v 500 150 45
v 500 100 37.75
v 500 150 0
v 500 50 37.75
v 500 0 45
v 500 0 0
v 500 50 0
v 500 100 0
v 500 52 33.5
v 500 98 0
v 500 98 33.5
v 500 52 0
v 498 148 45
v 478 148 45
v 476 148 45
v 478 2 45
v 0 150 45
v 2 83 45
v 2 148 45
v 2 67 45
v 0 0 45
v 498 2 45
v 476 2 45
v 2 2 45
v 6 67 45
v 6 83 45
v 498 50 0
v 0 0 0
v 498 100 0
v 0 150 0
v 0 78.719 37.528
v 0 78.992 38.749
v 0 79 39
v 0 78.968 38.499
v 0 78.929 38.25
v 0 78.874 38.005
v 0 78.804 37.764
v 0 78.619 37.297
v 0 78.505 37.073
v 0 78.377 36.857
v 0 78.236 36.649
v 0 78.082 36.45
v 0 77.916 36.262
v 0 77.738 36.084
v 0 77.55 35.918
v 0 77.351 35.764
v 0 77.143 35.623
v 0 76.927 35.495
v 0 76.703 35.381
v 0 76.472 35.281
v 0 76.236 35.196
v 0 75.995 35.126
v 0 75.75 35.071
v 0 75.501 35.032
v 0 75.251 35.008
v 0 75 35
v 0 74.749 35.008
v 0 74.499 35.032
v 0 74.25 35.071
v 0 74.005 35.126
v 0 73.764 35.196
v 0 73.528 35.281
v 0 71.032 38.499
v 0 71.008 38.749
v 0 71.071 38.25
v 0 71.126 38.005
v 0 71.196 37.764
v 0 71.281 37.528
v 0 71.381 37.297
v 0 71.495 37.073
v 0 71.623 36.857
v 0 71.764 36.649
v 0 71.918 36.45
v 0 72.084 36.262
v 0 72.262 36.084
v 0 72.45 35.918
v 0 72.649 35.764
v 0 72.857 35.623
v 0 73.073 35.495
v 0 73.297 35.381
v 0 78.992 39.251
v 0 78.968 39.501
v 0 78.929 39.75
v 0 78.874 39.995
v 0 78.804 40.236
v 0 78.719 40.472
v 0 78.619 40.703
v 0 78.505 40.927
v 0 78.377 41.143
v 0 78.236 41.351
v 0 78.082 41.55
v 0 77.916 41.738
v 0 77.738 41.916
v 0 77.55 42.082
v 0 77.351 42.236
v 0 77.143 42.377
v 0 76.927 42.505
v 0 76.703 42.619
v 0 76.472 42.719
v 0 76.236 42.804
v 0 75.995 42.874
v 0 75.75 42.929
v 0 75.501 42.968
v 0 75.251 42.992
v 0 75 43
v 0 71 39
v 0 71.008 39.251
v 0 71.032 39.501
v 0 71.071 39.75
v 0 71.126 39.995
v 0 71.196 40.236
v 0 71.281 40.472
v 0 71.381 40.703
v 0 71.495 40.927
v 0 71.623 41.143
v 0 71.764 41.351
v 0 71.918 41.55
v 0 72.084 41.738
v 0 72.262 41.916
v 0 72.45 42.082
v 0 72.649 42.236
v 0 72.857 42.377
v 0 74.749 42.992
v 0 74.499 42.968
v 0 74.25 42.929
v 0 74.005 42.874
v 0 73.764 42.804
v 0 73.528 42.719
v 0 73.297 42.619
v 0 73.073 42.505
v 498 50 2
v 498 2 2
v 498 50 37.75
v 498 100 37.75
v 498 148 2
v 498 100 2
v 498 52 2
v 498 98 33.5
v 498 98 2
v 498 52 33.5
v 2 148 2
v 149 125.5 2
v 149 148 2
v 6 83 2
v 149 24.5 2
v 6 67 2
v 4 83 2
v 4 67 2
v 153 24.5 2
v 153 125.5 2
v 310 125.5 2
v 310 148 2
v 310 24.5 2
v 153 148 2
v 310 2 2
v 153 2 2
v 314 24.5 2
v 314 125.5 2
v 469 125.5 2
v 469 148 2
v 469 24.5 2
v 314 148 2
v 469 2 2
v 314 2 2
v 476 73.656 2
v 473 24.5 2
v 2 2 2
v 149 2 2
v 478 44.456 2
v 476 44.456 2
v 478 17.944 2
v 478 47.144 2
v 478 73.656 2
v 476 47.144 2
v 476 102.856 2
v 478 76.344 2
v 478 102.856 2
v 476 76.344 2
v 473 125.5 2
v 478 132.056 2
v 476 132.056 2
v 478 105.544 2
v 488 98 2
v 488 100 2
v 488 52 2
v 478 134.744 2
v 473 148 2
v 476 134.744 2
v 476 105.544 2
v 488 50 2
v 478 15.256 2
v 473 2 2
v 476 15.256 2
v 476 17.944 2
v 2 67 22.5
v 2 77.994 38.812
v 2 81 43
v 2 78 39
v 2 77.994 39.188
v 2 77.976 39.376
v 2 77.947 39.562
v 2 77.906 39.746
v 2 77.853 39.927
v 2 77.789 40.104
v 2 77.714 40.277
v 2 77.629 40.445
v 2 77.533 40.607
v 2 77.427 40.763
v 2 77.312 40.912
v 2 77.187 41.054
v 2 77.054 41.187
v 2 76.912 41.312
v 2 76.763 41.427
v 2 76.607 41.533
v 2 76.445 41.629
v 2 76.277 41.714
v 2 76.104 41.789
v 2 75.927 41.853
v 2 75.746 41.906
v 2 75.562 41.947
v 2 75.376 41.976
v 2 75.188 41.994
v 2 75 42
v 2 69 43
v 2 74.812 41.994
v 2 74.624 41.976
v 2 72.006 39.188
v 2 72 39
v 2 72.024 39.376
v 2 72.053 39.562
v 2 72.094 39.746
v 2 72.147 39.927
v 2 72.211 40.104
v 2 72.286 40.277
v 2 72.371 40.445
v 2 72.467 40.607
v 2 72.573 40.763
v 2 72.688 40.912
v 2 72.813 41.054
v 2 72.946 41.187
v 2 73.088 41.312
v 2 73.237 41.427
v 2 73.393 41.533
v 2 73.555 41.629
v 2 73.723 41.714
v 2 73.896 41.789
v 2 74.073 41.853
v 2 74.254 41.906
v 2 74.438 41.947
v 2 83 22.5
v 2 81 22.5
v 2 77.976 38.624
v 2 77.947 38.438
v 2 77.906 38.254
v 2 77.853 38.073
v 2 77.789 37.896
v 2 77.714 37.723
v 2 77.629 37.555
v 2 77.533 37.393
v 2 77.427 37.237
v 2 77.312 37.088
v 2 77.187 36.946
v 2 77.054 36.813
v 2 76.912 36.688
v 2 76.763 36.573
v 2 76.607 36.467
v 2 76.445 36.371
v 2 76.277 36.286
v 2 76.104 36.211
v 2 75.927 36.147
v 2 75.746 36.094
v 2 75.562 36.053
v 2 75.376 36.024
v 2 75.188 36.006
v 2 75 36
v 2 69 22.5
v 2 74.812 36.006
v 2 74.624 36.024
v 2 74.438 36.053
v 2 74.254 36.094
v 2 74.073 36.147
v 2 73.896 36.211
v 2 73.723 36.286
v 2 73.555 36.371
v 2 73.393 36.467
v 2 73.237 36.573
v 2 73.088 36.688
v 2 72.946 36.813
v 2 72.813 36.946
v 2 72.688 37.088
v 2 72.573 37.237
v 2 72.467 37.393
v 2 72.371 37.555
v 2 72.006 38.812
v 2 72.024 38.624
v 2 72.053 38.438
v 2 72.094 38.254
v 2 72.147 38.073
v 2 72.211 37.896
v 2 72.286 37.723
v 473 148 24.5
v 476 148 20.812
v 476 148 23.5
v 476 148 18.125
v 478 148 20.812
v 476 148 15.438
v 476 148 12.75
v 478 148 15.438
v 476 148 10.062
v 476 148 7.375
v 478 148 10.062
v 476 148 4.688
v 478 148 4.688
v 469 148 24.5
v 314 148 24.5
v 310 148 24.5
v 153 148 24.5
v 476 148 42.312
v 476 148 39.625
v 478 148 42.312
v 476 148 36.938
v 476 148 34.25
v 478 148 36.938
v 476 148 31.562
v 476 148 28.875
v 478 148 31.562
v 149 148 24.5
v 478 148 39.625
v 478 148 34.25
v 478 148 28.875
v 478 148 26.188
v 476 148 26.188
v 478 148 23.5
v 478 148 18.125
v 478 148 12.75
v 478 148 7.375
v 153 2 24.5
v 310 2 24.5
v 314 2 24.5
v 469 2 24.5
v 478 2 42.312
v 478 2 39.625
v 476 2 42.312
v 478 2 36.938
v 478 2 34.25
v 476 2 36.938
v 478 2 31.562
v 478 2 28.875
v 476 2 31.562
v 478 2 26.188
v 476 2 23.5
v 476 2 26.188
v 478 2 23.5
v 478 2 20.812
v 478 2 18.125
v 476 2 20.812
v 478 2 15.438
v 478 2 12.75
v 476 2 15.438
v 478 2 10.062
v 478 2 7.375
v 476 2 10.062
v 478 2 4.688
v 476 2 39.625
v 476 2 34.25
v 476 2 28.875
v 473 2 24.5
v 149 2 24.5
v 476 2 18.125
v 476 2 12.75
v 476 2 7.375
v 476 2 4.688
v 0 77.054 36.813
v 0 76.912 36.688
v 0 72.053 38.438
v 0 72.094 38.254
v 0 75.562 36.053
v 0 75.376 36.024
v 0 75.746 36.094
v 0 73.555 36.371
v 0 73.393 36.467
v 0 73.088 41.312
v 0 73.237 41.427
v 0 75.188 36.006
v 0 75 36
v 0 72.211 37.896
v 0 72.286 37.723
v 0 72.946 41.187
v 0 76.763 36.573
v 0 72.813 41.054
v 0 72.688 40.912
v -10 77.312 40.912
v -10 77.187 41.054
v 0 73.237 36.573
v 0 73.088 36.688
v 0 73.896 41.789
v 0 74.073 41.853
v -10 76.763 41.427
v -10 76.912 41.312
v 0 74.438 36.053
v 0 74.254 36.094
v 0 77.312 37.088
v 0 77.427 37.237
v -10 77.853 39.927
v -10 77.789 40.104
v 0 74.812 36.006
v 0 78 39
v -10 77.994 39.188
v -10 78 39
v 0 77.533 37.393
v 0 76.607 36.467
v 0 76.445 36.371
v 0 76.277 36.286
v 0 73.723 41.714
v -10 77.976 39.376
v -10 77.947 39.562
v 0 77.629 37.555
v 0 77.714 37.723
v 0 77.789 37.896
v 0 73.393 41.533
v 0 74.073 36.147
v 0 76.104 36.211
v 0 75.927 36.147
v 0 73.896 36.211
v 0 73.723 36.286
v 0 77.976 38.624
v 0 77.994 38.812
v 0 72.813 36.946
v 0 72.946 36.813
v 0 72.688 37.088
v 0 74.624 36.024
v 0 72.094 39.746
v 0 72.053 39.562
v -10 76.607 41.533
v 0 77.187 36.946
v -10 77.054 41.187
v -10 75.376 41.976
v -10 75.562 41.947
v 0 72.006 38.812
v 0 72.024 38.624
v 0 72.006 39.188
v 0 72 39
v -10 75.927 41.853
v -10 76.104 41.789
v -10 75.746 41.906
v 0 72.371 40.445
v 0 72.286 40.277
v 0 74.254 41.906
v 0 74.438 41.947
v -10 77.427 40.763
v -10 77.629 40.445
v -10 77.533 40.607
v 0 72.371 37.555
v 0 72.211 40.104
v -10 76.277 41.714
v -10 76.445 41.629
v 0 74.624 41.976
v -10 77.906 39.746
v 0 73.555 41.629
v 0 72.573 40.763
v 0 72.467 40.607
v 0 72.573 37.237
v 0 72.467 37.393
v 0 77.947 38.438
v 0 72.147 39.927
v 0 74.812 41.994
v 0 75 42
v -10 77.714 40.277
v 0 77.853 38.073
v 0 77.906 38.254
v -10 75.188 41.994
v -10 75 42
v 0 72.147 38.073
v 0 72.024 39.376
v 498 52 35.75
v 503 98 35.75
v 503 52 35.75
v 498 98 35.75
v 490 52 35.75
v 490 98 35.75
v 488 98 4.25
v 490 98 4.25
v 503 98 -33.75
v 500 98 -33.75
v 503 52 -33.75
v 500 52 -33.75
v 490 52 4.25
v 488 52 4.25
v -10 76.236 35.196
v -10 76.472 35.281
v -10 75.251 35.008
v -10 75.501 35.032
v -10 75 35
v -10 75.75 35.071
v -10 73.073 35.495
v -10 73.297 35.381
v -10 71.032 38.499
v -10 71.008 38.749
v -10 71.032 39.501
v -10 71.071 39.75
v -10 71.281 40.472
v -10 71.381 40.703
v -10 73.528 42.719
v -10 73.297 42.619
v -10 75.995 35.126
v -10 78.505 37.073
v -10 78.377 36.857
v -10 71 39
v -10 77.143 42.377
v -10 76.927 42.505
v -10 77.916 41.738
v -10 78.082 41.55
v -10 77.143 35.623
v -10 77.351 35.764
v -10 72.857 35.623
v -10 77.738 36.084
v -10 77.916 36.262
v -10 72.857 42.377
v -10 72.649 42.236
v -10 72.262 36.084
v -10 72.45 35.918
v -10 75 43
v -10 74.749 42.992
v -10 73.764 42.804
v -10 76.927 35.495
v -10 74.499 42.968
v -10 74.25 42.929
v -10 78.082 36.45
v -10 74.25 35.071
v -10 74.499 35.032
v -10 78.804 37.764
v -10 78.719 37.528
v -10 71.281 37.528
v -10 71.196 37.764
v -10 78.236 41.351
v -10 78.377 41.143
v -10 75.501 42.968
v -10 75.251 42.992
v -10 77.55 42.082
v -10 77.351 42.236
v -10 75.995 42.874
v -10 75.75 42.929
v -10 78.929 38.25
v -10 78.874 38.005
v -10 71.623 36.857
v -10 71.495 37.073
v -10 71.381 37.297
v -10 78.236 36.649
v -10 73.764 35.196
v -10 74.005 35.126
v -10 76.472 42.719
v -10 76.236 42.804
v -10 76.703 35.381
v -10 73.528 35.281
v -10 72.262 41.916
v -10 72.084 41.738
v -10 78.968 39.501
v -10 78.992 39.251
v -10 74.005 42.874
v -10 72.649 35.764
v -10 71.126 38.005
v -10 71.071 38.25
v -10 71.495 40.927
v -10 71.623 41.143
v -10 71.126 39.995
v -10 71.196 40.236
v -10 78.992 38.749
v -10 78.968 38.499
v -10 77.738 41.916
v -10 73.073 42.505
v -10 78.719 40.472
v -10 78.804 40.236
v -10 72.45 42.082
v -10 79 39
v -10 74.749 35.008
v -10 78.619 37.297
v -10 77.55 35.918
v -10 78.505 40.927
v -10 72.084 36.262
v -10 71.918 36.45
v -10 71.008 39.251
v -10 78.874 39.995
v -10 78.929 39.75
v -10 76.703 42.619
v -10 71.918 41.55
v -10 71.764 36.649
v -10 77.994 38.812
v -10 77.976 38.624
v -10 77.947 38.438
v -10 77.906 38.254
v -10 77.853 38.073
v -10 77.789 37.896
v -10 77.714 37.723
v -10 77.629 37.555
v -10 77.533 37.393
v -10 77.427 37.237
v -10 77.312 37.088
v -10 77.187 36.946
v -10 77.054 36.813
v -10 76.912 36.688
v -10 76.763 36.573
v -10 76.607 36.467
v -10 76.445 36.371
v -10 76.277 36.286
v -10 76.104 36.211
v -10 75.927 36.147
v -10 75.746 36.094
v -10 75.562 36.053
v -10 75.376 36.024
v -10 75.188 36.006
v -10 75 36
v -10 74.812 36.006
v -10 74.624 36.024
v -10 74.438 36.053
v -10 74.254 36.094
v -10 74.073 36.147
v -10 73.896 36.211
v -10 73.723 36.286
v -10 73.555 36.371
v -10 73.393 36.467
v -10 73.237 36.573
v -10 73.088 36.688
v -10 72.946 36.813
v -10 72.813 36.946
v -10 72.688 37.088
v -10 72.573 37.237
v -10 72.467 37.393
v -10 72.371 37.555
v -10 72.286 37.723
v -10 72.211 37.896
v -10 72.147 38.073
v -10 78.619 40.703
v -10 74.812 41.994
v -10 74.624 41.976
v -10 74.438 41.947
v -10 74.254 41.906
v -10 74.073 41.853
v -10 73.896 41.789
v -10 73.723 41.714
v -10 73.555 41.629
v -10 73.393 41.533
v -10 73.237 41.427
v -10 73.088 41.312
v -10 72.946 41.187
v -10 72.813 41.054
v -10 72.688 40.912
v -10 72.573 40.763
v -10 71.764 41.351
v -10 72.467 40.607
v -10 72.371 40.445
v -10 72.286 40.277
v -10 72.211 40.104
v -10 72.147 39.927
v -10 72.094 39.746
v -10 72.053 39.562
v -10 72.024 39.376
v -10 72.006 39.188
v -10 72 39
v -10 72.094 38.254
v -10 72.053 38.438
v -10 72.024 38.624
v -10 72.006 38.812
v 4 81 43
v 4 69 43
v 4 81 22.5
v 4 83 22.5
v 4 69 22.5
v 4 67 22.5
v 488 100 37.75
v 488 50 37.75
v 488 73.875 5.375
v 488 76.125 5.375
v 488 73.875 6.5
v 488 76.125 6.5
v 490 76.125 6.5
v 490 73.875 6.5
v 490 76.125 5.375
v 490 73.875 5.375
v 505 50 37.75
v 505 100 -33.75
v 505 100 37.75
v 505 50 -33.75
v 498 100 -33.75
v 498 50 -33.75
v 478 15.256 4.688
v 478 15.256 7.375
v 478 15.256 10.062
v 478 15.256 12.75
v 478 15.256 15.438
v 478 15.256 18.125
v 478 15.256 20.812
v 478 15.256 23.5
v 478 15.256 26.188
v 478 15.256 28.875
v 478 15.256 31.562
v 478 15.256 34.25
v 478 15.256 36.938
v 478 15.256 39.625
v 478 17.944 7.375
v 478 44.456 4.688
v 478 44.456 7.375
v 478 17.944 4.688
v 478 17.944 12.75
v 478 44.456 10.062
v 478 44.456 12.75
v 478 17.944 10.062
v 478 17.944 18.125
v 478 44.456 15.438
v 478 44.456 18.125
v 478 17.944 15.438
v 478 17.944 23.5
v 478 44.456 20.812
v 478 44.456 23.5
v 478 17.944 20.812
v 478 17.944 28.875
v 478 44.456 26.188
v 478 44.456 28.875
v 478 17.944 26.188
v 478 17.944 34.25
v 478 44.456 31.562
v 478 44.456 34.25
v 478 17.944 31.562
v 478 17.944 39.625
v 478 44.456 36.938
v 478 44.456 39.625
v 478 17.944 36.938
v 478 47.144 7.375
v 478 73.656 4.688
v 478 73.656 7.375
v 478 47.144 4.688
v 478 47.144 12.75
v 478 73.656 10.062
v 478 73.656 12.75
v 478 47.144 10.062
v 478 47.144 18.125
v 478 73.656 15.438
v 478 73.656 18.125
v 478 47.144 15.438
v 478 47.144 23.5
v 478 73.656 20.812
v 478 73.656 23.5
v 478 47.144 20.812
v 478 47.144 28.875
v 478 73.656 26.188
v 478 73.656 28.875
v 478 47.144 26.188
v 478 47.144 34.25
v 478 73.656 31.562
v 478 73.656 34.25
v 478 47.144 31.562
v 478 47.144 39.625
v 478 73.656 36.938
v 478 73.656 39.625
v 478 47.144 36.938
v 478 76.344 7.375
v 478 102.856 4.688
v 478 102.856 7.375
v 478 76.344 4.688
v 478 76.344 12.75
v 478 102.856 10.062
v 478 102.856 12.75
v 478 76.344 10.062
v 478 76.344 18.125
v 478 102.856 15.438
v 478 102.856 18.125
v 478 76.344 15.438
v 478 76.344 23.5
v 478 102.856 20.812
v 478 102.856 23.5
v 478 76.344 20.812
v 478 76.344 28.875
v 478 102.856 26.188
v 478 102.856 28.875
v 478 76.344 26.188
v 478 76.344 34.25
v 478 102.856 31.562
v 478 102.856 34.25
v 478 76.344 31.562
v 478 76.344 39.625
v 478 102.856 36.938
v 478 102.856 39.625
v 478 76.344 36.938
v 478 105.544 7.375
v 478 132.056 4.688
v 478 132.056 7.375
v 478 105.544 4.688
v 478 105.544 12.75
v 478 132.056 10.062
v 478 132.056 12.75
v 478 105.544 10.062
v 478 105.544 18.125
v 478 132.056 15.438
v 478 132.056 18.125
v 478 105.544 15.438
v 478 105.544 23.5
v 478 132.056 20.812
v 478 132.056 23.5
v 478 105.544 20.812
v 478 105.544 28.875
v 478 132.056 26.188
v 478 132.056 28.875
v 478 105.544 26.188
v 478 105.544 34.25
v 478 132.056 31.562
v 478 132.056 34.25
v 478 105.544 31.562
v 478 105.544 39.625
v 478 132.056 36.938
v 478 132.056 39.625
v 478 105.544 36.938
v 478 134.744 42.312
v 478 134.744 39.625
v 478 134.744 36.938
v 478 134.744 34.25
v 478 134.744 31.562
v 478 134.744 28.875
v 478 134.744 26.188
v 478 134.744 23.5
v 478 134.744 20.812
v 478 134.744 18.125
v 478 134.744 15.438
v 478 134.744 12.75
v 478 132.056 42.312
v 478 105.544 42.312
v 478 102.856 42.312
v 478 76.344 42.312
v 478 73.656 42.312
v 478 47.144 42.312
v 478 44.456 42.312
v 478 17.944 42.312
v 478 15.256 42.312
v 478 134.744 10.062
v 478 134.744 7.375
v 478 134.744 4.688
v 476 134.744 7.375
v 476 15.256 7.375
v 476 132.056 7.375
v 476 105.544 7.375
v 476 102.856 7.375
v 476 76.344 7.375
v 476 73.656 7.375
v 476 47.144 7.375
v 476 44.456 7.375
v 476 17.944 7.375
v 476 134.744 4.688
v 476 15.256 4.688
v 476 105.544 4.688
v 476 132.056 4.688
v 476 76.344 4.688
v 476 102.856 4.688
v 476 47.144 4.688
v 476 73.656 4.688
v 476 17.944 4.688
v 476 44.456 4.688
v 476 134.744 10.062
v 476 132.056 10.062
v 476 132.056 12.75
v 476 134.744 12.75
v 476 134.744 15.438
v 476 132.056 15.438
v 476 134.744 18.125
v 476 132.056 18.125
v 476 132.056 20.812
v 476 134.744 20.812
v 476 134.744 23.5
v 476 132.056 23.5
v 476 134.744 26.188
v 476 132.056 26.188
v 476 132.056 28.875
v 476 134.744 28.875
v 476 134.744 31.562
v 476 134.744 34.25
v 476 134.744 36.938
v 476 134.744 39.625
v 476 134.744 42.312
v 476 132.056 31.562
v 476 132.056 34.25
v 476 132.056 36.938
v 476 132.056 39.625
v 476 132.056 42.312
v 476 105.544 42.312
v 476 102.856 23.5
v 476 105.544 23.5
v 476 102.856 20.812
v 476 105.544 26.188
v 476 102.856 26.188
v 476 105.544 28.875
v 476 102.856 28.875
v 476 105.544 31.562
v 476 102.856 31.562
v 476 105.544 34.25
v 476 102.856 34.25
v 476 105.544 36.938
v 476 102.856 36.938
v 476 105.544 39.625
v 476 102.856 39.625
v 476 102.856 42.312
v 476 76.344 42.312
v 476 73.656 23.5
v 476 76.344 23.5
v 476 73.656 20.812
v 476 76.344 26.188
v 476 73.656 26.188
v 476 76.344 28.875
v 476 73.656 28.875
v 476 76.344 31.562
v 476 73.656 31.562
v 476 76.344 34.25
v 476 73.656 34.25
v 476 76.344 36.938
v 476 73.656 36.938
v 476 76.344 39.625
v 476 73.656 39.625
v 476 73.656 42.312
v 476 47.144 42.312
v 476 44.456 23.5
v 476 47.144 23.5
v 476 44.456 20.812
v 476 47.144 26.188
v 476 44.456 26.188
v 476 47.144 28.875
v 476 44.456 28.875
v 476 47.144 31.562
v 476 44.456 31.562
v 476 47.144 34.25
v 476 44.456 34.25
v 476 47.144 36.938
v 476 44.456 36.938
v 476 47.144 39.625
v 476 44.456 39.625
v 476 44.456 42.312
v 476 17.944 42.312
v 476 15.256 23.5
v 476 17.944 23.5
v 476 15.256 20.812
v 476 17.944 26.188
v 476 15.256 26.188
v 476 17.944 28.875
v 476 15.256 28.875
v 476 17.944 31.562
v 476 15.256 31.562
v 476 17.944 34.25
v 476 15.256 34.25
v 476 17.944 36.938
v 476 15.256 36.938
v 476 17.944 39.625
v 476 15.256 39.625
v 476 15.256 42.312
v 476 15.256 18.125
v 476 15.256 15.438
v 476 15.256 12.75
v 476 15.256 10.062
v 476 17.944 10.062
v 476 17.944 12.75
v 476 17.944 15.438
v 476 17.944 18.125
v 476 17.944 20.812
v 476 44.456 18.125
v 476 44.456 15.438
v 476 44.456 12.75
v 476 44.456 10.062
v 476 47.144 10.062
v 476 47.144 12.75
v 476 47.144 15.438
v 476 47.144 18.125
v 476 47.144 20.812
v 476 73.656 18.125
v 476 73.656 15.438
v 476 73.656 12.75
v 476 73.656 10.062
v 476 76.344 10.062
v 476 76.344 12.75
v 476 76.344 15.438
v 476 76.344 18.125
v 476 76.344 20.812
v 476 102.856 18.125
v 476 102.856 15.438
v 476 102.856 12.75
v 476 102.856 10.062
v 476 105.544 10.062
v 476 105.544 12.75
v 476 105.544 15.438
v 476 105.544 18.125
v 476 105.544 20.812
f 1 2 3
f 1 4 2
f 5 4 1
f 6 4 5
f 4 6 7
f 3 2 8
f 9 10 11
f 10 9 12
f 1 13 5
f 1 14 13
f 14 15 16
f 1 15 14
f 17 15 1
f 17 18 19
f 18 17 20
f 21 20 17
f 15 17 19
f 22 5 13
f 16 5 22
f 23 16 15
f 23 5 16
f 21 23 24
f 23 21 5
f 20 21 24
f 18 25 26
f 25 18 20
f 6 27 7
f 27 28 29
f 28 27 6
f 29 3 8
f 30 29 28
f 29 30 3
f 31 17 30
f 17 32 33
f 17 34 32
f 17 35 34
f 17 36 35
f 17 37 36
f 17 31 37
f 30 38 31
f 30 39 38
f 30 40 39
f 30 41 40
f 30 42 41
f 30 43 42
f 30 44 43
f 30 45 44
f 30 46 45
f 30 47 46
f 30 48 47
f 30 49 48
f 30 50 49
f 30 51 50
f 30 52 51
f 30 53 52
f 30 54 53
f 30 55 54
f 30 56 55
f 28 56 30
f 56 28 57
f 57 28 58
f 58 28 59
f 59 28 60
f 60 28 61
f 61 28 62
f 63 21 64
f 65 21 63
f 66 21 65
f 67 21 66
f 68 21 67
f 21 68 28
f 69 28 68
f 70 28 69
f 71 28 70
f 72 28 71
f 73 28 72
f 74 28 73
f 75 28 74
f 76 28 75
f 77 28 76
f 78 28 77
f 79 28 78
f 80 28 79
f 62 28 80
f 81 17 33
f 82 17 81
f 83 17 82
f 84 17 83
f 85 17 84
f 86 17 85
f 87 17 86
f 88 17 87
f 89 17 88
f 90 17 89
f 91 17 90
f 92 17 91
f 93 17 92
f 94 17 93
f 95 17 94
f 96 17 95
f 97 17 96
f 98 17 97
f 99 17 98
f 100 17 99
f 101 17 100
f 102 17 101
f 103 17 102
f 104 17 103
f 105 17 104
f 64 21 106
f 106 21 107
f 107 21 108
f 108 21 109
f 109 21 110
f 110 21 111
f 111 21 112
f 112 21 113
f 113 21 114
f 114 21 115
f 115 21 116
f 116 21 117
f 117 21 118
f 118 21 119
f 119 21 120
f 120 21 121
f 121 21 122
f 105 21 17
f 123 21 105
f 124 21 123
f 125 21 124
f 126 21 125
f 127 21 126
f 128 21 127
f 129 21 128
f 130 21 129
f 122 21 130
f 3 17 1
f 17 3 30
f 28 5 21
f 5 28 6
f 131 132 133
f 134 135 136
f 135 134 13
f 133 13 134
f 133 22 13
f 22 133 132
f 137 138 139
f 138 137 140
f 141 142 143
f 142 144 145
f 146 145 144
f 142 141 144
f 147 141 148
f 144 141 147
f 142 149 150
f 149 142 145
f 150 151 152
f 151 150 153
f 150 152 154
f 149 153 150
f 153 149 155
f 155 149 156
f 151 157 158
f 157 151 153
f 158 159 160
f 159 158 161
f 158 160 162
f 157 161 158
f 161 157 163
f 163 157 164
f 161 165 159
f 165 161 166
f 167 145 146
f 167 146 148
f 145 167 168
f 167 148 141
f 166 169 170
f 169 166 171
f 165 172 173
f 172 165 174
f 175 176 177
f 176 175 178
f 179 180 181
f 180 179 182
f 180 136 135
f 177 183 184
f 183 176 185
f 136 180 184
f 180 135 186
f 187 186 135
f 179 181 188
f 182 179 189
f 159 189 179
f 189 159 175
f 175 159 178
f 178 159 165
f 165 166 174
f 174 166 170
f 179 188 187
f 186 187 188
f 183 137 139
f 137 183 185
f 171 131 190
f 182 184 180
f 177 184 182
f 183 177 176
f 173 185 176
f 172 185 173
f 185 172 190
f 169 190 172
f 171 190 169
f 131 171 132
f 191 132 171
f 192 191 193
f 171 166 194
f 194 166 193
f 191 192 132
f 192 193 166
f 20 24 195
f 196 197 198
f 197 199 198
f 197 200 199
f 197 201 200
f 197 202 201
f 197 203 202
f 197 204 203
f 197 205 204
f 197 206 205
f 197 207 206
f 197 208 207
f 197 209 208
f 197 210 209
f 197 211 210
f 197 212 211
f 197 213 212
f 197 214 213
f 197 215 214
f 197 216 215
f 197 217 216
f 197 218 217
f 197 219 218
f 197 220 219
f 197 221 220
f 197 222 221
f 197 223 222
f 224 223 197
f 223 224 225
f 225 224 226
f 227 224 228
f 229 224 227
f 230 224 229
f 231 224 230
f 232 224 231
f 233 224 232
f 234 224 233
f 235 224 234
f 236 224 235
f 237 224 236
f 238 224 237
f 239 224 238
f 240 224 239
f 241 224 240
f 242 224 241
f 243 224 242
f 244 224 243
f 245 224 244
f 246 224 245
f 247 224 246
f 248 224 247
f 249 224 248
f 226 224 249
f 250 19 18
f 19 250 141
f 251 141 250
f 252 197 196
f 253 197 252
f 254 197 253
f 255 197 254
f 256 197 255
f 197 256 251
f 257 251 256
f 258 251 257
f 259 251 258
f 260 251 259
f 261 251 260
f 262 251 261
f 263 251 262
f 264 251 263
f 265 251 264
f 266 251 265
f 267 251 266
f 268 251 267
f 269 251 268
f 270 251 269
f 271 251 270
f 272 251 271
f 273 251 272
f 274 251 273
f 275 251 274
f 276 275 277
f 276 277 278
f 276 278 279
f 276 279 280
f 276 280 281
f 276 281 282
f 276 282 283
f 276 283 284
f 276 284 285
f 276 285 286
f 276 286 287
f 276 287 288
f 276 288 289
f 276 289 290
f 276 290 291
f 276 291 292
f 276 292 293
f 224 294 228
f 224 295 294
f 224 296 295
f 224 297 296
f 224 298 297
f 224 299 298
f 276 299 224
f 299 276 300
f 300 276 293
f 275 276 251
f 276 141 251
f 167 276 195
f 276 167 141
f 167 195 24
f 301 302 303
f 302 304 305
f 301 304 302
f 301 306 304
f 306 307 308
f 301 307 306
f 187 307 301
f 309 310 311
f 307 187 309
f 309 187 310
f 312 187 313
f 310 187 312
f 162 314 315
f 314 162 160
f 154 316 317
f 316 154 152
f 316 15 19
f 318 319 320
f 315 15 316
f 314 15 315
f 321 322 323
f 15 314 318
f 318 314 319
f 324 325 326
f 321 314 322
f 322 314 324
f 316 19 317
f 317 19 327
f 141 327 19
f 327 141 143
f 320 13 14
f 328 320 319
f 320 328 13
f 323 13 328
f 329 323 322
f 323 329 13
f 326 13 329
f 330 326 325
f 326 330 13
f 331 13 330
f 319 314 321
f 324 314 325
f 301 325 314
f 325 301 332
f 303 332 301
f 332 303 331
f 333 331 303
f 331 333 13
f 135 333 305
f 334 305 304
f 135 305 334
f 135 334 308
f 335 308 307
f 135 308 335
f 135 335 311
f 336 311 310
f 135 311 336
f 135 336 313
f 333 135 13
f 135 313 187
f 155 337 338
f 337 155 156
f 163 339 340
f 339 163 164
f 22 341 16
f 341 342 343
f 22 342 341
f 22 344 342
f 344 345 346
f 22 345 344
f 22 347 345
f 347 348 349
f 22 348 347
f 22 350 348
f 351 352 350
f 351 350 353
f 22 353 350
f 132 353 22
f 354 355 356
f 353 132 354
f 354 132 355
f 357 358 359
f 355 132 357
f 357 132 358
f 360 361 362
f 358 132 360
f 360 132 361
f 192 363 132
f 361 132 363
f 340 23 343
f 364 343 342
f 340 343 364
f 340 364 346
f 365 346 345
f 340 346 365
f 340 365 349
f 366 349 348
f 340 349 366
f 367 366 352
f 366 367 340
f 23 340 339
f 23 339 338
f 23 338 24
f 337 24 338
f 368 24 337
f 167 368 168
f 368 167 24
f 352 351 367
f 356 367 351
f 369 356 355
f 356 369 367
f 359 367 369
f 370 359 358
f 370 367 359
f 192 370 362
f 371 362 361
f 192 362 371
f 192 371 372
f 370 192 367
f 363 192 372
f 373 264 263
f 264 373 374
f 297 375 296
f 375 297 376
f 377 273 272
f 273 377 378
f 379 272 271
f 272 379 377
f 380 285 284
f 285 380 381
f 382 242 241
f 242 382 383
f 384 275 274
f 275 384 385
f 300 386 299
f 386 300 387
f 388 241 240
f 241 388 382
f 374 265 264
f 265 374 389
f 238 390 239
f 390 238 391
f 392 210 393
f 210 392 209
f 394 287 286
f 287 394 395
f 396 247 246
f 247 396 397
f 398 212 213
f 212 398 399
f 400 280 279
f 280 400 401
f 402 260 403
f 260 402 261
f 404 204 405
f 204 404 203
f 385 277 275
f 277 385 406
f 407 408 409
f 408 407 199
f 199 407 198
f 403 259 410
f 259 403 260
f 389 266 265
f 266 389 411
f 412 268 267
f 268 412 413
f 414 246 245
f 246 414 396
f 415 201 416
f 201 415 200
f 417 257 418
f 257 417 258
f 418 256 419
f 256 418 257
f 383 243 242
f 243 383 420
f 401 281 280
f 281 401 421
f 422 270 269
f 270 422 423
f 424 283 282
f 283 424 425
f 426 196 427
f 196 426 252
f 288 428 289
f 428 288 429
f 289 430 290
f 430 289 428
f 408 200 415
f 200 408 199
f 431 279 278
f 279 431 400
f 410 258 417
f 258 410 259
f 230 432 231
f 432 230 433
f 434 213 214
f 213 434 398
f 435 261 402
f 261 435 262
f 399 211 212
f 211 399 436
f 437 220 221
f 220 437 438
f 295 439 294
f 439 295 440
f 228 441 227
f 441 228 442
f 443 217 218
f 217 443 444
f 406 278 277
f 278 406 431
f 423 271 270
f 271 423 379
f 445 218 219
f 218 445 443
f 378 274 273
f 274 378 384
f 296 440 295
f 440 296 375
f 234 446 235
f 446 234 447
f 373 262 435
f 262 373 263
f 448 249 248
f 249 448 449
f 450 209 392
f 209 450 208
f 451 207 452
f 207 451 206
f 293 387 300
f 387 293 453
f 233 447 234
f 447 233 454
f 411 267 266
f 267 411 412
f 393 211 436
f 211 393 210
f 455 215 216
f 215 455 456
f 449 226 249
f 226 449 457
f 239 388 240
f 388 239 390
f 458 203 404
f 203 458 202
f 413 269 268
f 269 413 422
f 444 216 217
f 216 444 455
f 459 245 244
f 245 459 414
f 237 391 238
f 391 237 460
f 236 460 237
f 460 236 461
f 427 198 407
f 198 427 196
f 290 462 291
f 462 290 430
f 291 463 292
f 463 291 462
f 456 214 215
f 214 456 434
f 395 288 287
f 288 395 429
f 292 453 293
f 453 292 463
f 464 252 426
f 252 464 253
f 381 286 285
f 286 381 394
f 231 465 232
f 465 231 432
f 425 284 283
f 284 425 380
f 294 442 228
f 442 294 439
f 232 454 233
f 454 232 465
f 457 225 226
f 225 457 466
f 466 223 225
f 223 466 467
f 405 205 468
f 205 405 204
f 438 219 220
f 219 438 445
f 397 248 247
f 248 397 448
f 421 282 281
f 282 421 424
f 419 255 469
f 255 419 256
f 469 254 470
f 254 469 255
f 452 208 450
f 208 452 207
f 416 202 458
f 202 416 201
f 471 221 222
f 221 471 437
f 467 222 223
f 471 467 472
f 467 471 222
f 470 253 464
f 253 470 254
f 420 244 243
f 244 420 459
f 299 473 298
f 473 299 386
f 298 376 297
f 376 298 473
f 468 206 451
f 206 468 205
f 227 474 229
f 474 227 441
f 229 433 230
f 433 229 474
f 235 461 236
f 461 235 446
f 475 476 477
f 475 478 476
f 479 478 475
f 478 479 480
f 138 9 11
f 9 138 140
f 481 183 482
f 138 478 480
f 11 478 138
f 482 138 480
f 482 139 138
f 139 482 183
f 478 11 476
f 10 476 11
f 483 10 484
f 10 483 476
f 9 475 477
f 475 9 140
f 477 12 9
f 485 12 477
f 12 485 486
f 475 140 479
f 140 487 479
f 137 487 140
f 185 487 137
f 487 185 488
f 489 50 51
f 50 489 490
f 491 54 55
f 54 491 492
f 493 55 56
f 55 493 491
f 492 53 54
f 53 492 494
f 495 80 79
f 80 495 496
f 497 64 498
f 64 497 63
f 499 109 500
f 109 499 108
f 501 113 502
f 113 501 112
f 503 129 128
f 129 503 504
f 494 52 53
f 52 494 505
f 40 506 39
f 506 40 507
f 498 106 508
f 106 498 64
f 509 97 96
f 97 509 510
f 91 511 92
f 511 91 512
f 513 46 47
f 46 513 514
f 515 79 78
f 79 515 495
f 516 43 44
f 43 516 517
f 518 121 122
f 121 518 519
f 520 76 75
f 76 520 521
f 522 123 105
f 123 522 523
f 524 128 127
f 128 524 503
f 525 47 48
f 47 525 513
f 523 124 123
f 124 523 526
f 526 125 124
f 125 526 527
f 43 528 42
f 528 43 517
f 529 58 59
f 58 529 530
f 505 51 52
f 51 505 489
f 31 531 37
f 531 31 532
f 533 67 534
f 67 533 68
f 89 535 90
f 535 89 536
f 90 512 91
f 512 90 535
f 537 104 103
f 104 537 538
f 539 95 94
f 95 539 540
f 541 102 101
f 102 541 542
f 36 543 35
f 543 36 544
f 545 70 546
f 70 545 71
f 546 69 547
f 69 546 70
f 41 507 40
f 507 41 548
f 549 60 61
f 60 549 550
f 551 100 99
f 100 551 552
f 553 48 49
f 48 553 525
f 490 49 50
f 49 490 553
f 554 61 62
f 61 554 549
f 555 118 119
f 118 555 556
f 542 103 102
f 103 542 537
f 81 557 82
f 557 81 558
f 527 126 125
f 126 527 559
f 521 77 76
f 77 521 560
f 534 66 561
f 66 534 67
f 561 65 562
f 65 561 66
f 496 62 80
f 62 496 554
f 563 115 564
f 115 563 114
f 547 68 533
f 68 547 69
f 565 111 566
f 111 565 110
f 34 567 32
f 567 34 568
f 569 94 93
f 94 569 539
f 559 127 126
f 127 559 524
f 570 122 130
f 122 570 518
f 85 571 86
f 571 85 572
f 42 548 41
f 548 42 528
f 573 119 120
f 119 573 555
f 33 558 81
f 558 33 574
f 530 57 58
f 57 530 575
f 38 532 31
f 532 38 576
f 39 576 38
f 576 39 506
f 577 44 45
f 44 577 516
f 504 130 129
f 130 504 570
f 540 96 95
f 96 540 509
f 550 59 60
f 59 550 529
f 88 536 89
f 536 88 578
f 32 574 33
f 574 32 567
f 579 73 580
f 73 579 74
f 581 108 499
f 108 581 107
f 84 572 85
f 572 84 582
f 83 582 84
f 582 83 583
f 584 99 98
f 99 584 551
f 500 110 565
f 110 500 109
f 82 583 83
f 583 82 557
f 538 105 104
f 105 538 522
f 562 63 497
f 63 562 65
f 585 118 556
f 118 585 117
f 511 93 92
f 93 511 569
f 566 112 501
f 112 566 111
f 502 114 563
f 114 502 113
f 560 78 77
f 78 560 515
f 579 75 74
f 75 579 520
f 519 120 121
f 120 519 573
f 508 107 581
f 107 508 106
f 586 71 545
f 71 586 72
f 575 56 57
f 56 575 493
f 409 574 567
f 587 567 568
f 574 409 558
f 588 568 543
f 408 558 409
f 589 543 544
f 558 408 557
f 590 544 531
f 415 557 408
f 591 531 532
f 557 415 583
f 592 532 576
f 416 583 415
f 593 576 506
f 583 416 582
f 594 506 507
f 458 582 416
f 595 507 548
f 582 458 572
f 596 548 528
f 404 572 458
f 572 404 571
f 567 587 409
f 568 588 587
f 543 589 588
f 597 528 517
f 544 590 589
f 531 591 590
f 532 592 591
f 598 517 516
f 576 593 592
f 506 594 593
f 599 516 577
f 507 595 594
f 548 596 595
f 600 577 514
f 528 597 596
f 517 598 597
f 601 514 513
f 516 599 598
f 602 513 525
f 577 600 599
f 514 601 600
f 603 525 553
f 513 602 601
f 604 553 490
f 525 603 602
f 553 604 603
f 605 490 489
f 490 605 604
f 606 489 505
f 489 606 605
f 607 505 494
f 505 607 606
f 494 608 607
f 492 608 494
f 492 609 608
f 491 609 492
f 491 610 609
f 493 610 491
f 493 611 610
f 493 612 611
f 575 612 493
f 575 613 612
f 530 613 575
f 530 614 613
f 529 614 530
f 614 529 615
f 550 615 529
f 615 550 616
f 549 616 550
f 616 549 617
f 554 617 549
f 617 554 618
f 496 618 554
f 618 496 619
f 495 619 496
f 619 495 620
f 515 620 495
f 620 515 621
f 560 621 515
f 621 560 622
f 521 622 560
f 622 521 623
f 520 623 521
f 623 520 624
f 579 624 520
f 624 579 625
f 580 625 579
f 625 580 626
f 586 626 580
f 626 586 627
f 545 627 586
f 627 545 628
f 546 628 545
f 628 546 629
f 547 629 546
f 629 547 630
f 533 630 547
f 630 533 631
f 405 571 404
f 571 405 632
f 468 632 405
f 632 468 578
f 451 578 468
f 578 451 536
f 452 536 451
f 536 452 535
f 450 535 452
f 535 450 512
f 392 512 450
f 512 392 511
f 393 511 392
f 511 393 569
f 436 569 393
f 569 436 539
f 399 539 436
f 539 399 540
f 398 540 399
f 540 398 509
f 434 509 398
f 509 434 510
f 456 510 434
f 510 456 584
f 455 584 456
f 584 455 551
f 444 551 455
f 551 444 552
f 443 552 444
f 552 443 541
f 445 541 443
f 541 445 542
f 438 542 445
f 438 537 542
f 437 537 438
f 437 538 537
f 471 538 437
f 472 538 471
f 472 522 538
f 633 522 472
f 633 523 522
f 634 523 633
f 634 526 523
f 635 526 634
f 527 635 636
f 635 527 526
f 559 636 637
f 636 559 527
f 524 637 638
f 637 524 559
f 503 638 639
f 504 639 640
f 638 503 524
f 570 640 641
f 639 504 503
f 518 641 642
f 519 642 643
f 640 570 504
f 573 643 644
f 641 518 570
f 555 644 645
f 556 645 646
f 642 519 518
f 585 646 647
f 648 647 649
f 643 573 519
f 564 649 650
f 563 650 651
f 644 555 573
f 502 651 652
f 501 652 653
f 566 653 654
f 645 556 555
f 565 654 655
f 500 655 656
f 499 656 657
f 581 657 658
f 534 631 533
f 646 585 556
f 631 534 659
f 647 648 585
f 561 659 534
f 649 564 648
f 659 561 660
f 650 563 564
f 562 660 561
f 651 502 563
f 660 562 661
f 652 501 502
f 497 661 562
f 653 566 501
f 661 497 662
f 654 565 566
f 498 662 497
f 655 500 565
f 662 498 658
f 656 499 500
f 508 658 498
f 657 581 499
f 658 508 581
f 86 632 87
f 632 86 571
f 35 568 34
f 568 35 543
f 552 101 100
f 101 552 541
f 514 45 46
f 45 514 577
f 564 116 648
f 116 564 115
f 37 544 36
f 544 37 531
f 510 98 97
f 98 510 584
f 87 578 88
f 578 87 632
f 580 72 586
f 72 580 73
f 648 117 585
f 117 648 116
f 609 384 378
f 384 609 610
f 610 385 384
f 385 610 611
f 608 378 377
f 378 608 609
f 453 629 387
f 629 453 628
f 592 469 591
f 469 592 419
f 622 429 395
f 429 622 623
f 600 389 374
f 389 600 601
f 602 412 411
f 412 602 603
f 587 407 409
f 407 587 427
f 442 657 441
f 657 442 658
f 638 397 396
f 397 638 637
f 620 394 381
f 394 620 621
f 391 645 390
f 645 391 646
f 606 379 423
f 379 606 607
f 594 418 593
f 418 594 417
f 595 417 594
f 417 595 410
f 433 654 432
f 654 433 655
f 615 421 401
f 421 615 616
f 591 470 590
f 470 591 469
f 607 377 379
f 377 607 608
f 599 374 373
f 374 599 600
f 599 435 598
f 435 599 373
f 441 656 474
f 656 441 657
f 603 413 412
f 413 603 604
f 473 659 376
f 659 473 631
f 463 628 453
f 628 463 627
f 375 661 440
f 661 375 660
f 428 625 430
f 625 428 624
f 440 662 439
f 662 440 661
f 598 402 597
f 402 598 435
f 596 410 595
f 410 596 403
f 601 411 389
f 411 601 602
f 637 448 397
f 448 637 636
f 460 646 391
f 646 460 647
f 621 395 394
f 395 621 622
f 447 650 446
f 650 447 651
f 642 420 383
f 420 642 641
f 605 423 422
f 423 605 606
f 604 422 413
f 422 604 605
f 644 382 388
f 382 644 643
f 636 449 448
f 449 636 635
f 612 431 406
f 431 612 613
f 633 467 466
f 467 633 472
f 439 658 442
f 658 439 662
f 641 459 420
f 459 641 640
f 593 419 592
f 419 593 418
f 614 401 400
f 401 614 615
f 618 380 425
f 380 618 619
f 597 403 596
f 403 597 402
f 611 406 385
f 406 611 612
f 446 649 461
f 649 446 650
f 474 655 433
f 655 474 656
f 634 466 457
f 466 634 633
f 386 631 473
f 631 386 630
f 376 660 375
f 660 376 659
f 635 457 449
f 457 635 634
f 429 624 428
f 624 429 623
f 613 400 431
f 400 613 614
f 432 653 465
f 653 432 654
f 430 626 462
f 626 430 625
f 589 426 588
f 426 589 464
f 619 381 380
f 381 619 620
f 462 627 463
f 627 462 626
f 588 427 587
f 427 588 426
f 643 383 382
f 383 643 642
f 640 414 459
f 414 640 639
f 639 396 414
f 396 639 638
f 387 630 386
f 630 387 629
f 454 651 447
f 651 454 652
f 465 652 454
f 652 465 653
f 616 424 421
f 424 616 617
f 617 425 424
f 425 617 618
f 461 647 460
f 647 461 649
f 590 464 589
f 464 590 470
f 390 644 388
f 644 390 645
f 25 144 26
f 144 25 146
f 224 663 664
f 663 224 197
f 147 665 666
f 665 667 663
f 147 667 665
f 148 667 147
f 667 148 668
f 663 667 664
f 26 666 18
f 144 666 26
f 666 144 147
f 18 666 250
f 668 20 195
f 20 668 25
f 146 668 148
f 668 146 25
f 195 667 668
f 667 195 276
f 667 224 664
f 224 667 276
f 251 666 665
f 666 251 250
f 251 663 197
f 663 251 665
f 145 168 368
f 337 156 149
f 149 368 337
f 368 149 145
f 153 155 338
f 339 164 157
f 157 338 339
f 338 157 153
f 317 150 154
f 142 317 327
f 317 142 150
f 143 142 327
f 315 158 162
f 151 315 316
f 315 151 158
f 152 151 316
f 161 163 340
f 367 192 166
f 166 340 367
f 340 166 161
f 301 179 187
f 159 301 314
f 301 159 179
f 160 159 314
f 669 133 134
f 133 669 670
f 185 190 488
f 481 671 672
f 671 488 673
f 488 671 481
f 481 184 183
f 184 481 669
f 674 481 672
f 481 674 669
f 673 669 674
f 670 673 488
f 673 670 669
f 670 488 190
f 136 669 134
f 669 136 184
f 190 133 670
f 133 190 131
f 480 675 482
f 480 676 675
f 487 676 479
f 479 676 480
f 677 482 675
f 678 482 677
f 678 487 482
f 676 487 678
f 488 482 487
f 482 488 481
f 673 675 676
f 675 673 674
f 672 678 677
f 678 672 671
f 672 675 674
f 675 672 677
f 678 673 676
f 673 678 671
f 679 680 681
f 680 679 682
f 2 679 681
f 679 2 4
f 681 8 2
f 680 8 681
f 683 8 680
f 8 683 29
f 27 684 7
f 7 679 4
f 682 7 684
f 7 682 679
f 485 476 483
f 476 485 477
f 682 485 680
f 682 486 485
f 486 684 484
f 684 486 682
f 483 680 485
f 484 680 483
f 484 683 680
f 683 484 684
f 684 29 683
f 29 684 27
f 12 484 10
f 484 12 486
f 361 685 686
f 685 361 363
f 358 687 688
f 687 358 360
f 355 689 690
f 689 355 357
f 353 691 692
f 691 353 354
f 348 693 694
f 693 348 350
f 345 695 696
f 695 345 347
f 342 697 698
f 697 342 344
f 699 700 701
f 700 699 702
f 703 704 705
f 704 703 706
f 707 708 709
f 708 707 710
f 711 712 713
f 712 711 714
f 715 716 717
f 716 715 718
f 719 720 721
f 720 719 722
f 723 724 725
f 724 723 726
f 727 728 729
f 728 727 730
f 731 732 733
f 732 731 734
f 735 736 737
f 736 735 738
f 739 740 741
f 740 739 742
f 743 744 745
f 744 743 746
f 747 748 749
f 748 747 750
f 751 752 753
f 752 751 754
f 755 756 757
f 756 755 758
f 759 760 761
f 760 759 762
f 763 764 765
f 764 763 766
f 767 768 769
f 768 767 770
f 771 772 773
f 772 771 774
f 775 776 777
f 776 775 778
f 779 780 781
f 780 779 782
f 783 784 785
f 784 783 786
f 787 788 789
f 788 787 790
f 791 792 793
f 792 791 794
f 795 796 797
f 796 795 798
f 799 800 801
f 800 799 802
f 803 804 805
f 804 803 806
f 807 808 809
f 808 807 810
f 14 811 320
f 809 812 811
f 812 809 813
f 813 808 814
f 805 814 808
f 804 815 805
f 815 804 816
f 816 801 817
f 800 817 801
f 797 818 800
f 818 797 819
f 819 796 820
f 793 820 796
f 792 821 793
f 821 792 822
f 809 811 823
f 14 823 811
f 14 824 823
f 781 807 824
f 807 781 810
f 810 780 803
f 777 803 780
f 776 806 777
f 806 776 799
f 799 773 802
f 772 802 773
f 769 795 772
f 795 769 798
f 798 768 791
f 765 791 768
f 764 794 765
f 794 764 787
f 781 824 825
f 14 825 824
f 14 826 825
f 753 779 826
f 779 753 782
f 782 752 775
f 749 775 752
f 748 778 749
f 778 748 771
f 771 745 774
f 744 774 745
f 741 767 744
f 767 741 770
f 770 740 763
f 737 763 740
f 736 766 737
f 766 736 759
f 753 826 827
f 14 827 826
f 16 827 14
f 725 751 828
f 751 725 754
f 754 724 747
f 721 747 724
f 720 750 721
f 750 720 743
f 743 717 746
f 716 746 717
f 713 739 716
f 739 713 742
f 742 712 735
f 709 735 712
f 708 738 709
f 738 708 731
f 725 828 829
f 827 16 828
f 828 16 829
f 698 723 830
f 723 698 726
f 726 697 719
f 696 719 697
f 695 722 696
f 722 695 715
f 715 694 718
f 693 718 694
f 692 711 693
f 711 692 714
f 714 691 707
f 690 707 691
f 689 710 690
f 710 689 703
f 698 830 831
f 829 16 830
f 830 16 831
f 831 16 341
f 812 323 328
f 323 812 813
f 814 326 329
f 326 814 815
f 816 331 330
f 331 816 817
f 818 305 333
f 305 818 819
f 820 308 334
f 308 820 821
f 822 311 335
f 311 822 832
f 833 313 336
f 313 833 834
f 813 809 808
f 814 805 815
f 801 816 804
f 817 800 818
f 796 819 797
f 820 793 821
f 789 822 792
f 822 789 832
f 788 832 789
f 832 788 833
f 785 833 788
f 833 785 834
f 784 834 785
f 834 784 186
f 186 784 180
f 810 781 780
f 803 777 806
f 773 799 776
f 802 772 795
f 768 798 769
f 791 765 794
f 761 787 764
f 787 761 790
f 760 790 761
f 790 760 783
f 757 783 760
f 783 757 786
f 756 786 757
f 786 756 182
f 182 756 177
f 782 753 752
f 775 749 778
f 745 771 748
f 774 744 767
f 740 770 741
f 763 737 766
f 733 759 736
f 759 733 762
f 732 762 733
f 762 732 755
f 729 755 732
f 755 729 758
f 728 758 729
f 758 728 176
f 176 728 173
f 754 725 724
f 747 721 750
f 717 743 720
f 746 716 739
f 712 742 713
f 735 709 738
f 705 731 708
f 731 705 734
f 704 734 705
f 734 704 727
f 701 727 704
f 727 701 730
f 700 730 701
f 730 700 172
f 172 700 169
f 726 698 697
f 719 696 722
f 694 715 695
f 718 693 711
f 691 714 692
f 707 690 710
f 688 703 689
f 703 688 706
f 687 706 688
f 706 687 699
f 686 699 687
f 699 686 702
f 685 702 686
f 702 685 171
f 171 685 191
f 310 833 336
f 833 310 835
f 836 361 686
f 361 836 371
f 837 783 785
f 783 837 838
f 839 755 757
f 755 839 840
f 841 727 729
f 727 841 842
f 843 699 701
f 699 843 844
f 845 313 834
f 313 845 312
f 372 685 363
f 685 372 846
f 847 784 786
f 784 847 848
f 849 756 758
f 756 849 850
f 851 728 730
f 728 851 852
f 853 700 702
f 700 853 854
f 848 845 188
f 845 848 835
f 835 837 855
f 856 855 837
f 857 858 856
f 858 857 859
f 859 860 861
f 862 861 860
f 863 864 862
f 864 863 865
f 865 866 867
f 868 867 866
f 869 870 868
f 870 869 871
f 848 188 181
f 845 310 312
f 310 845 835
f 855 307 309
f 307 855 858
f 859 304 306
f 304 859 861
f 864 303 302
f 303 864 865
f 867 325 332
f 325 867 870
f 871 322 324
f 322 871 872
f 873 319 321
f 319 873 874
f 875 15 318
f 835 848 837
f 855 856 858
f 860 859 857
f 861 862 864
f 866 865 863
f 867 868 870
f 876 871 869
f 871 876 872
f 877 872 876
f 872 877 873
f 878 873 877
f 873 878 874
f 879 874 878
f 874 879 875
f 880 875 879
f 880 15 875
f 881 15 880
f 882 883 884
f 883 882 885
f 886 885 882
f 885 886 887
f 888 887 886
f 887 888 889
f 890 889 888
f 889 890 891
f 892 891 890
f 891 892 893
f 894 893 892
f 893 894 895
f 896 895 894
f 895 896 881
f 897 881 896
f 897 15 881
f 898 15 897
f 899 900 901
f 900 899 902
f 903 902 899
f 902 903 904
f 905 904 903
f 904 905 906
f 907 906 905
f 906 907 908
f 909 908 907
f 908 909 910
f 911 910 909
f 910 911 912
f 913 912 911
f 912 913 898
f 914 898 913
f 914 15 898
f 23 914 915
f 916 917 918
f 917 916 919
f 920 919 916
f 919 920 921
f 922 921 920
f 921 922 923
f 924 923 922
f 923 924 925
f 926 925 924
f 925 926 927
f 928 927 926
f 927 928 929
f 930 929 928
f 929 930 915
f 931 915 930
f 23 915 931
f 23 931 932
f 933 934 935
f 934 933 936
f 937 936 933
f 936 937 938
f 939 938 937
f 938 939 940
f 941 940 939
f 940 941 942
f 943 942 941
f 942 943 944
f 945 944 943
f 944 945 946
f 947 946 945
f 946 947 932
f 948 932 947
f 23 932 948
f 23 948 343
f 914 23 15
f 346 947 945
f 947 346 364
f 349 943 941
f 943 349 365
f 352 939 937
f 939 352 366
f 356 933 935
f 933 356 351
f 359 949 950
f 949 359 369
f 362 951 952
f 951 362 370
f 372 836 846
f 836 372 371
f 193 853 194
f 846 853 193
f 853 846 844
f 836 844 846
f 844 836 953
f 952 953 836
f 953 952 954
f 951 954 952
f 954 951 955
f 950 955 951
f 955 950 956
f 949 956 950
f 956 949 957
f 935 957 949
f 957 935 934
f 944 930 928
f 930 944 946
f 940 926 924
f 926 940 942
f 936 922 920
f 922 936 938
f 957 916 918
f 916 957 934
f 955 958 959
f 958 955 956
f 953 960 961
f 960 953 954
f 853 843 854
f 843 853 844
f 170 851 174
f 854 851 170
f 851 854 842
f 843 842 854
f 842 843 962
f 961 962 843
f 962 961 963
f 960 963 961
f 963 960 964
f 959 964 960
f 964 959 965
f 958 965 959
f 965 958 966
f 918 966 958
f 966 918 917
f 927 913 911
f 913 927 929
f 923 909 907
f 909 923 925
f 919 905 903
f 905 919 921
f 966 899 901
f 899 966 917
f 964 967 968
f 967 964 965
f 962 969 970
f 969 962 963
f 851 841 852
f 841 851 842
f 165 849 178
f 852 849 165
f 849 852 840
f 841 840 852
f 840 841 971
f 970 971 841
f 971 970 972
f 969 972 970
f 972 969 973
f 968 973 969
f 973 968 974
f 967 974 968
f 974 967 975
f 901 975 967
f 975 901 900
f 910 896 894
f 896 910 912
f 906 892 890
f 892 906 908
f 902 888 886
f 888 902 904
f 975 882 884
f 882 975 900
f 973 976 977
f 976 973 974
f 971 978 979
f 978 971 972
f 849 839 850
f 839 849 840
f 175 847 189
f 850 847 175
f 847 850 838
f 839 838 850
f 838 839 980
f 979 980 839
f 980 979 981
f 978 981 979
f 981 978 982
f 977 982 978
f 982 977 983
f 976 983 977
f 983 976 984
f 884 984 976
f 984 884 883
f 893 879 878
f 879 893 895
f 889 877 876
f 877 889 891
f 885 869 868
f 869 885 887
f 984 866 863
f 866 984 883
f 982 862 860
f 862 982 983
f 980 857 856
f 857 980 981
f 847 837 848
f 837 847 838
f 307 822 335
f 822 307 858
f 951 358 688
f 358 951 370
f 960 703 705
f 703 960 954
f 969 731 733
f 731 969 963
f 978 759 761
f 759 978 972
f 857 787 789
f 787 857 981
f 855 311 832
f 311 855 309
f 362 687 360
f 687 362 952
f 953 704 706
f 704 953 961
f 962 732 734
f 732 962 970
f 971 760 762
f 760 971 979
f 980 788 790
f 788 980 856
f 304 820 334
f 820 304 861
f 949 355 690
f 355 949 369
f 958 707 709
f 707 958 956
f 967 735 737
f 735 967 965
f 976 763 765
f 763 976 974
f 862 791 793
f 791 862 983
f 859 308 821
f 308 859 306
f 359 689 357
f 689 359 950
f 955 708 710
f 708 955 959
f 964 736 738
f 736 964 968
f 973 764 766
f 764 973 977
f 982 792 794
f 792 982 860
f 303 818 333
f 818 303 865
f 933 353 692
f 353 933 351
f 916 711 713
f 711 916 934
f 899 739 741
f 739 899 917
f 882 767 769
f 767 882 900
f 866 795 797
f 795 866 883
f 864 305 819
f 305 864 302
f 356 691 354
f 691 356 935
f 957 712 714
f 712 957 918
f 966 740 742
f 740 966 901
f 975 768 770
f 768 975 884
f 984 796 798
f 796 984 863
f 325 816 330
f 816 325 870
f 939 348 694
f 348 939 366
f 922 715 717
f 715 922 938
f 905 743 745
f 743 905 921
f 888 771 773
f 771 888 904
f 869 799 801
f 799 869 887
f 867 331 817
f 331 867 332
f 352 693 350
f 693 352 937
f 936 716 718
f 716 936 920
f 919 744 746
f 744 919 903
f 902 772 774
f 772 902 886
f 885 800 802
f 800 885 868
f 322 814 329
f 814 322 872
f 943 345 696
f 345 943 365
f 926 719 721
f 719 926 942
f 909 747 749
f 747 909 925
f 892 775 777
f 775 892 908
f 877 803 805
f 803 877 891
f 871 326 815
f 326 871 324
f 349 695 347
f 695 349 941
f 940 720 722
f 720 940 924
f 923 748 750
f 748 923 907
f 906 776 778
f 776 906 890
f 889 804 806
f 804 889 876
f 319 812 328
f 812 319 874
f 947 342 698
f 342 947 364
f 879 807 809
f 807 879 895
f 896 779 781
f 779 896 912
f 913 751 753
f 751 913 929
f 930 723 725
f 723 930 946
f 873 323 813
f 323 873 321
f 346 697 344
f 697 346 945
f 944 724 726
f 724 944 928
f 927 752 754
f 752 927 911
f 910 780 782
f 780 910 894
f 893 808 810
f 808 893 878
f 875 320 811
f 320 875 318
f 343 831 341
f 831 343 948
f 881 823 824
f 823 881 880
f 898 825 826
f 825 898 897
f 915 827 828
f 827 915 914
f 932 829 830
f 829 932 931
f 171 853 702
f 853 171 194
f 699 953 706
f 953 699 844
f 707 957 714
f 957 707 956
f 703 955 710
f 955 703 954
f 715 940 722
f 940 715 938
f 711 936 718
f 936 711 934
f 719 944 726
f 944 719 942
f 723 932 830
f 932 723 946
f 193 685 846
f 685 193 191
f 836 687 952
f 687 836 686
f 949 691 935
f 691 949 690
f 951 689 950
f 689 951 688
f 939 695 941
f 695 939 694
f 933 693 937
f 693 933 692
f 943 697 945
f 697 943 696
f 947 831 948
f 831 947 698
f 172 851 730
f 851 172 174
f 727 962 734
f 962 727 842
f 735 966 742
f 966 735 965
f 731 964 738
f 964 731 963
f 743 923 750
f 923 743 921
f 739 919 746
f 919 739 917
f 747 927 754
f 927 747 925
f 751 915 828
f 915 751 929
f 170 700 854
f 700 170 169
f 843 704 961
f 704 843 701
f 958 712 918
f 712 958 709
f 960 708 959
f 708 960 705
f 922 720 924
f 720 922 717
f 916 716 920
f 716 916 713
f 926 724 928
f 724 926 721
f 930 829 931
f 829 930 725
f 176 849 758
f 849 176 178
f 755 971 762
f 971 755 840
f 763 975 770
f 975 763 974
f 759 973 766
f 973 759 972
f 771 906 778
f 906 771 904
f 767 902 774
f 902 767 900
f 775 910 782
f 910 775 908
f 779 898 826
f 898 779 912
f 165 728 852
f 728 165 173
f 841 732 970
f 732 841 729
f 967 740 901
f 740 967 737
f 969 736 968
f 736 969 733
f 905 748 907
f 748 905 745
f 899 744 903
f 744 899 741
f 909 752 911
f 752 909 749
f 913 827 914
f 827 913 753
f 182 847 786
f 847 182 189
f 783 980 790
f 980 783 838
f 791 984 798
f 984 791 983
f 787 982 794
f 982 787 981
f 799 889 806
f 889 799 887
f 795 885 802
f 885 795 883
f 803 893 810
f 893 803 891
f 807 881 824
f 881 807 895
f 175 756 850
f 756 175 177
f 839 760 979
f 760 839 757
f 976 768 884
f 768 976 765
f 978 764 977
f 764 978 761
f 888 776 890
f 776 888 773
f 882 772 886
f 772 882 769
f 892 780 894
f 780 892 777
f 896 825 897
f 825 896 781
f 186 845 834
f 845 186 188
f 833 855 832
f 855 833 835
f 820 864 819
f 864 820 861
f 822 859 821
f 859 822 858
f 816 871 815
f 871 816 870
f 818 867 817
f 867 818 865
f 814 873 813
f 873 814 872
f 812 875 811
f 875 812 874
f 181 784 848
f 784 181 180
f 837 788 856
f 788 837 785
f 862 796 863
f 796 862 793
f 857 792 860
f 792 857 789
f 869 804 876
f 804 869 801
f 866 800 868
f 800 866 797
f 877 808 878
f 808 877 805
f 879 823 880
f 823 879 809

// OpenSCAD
$fn = 100;
epsilon = 1;

printerMaxPartSize = 170;

bedWidth = 500;
bedDepth = 150;
bedHeight = 45;
bedWallThickness = 2;

intakeInnerD = 6;
intakeOuterD = 8;
intakeHeight = 10;

intakeWallSpacing = 2;
intakeWallWidth = intakeOuterD * 2;
intakeWallThickness = 2;

drainWidth = bedDepth / 3;
drainIntakeDepth = drainWidth / 5;
drainOutputDepth = drainIntakeDepth / 2;
drainTreshold = bedHeight * 0.7;
drainWallThickness = bedWallThickness;
drainIntakeHeight = bedHeight * 0.05;
drainOutputHeight = bedHeight * 0.75;

filterXCount = 5;
filterYCount = 8;
filterTickness = filterXCount > filterYCount
        ? (bedDepth - bedWallThickness * 2) / (filterXCount * 2)
        : (bedHeight - bedWallThickness) / (filterYCount * 2);

bedMainPartWidth = bedWidth + intakeHeight - drainIntakeDepth * 2 - drainOutputDepth - bedWallThickness;
flangeCount = ceil(bedMainPartWidth / printerMaxPartSize);
flangeSize = bedHeight * 0.5;
flangeThickness = 4;

module bed() {
    difference() {
        cube([
            bedWidth,
            bedDepth,
            bedHeight
        ]);

        translate([
            bedWallThickness,
            bedWallThickness,
            bedWallThickness
        ])
        cube([
            bedWidth - bedWallThickness * 2,
            bedDepth - bedWallThickness * 2,
            bedHeight - bedWallThickness + epsilon
        ]);

        // intake
        translate([
            -epsilon,
            bedDepth / 2,
            bedHeight - intakeOuterD/2 - intakeWallThickness
        ])
        rotate([
            0,
            90,
            0
        ])
        cylinder(d=intakeInnerD, h = bedWallThickness + epsilon * 2);

        // drain
        translate([
            bedWidth - bedWallThickness - epsilon,
            bedDepth / 2 - drainWidth / 2 + bedWallThickness,
            drainTreshold + bedWallThickness
        ])
        cube([
            bedWallThickness + epsilon * 2,
            drainWidth - drainWallThickness * 2,
            drainIntakeHeight
        ]);
    }

}

module intake() {
     translate([
        -intakeHeight,
        bedDepth / 2,
        bedHeight - intakeOuterD/2 - intakeWallThickness
    ])
    rotate([
        0,
        90,
        0
    ])
    difference() {
        cylinder(d=intakeOuterD, h=intakeHeight);

        translate([
            0,
            0,
            -epsilon
        ])
        cylinder(d=intakeInnerD, h=intakeHeight + 2 * epsilon);
    }

    translate([
        bedWallThickness + intakeWallSpacing,
        bedDepth / 2 - intakeWallWidth / 2,
        bedWallThickness
    ])
    cube([
        intakeWallThickness,
        intakeWallWidth,
        bedHeight - bedWallThickness - intakeWallThickness
    ]);

    translate([
        bedWallThickness,
        bedDepth / 2 - intakeWallWidth / 2,
        bedHeight - intakeWallThickness
    ])
    cube([
        intakeWallThickness + intakeWallSpacing,
        intakeWallWidth,
        intakeWallThickness
    ]);

    translate([
        bedWallThickness,
        bedDepth / 2 - intakeWallWidth / 2,
        (bedHeight - bedWallThickness - intakeWallThickness) / 2 + bedWallThickness
    ])
    cube([
        intakeWallSpacing,
        intakeWallThickness,
        (bedHeight - bedWallThickness - intakeWallThickness) / 2
    ]);

    translate([
        bedWallThickness,
        bedDepth / 2 + intakeWallWidth / 2 - intakeWallThickness,
        (bedHeight - bedWallThickness - intakeWallThickness) / 2 + bedWallThickness
    ])
    cube([
        intakeWallSpacing,
        intakeWallThickness,
        (bedHeight - bedWallThickness - intakeWallThickness) / 2
    ]);
}


module flange() {
    if (flangeCount > 1) {

        for(side = ["near", "far"]) {
            for(i = [1:flangeCount - 1]) {
                translate([
                    bedMainPartWidth / flangeCount * i - (flangeThickness / 2 * (side == "far" ? -1 : 1)) - intakeHeight,
                    (side == "far" ? bedDepth - bedWallThickness: bedWallThickness),
                    bedWallThickness
                ])
                rotate([
                    90,
                    0,
                    90 * (side == "far" ? -1 : 1)
                ])
                linear_extrude(height=flangeThickness)
                {
                    polygon(
                        points=[[0,0],[flangeSize,0],[0,flangeSize]],
                        paths=[[0,1,2]]
                    );
                }
            }
        }
    }

    if (bedWidth + intakeHeight > printerMaxPartSize) {
        for(side = ["near", "far"]) {
            translate([
                bedMainPartWidth - (flangeThickness / 2 * (side == "far" ? -1 : 1)) - intakeHeight - flangeThickness / 2,
                (side == "far" ? bedDepth - bedWallThickness: bedWallThickness),
                bedWallThickness
            ])
            rotate([
                90,
                0,
                90 * (side == "far" ? -1 : 1)
            ])
            linear_extrude(height=flangeThickness)
            {
                polygon(
                    points=[[0,0],[flangeSize,0],[0,flangeSize]],
                    paths=[[0,1,2]]
                );
            }
        }
    }
}

module drain() {
    translate([
        bedWidth - drainIntakeDepth - bedWallThickness,
        bedDepth / 2 - drainWidth / 2,
        0,
    ])
    union() {
        translate([
            0,
            0,
            bedWallThickness
        ])
        difference() {
            cube([
                drainIntakeDepth,
                drainWidth,
                drainTreshold + drainIntakeHeight + drainWallThickness
            ]);

            translate([
                drainWallThickness,
                drainWallThickness,
                -epsilon
            ])
            cube([
                drainIntakeDepth - drainWallThickness + epsilon,
                drainWidth - drainWallThickness * 2,
                drainTreshold  + drainIntakeHeight  + epsilon
            ]);
            
            translate([
                -epsilon,
                drainWallThickness,
                -epsilon
            ])
            cube([
                drainWallThickness + epsilon * 2,
                drainWidth - drainWallThickness * 2,
                drainIntakeHeight + epsilon
            ]);

            translate([
                -epsilon,
                drainWidth / 2 - drainIntakeHeight / 2,
                drainIntakeHeight + drainIntakeHeight / 2
            ])
            cube([
                drainWallThickness + epsilon * 2,
                drainIntakeHeight,
                drainIntakeHeight / 2
            ]);
        }

        translate([
            drainOutputDepth * 2 + bedWallThickness,
            0,
            0
        ])
        union() {
            difference() {
                cube([
                    drainOutputDepth,
                    drainWidth,
                    drainTreshold + drainIntakeHeight + drainWallThickness + bedWallThickness
                ]);

                translate([
                    -epsilon,
                    drainWallThickness,
                    -epsilon
                ])
                cube([
                    drainOutputDepth - drainWallThickness + epsilon,
                    drainWidth - drainWallThickness * 2,
                    drainTreshold  + drainIntakeHeight + bedWallThickness + epsilon
                ]);
            }

            translate([
                -drainWallThickness,
                0,
                -drainOutputHeight
            ])
            difference() {
                cube([
                    drainOutputDepth + bedWallThickness,
                    drainWidth,
                    drainOutputHeight
                ]);

                translate([
                    drainWallThickness,
                    drainWallThickness,
                    -epsilon
                ])
                cube([
                    drainOutputDepth - drainWallThickness,
                    drainWidth - drainWallThickness * 2,
                    drainOutputHeight + epsilon * 2
                ]);
            }
        }
    }
}

module filter() {
    for(i = [1:filterYCount]) {
        step = (bedHeight - bedWallThickness) / (filterYCount * 2) * i;

        translate([
            bedWidth - bedWallThickness - drainIntakeDepth * 2 - bedWallThickness,
            bedWallThickness,
            bedWallThickness + step + filterTickness * (i - 1)
        ])
        cube([
            bedWallThickness,
            bedDepth - bedWallThickness * 2,
            filterTickness
        ]);
    }

    for(i = [1:filterXCount]) {
        step = (bedDepth - bedWallThickness * 2) / filterXCount  * i;

        translate([
            bedWidth - bedWallThickness - drainIntakeDepth * 2 - bedWallThickness,
            bedWallThickness + step - filterTickness / 2 - (bedDepth - bedWallThickness * 2) / filterXCount / 2,
            bedWallThickness 
        ])
        cube([
            bedWallThickness,
            filterTickness,
            bedHeight - bedWallThickness
        ]);
    }
}

bed();
intake();
flange();
drain();
filter();
